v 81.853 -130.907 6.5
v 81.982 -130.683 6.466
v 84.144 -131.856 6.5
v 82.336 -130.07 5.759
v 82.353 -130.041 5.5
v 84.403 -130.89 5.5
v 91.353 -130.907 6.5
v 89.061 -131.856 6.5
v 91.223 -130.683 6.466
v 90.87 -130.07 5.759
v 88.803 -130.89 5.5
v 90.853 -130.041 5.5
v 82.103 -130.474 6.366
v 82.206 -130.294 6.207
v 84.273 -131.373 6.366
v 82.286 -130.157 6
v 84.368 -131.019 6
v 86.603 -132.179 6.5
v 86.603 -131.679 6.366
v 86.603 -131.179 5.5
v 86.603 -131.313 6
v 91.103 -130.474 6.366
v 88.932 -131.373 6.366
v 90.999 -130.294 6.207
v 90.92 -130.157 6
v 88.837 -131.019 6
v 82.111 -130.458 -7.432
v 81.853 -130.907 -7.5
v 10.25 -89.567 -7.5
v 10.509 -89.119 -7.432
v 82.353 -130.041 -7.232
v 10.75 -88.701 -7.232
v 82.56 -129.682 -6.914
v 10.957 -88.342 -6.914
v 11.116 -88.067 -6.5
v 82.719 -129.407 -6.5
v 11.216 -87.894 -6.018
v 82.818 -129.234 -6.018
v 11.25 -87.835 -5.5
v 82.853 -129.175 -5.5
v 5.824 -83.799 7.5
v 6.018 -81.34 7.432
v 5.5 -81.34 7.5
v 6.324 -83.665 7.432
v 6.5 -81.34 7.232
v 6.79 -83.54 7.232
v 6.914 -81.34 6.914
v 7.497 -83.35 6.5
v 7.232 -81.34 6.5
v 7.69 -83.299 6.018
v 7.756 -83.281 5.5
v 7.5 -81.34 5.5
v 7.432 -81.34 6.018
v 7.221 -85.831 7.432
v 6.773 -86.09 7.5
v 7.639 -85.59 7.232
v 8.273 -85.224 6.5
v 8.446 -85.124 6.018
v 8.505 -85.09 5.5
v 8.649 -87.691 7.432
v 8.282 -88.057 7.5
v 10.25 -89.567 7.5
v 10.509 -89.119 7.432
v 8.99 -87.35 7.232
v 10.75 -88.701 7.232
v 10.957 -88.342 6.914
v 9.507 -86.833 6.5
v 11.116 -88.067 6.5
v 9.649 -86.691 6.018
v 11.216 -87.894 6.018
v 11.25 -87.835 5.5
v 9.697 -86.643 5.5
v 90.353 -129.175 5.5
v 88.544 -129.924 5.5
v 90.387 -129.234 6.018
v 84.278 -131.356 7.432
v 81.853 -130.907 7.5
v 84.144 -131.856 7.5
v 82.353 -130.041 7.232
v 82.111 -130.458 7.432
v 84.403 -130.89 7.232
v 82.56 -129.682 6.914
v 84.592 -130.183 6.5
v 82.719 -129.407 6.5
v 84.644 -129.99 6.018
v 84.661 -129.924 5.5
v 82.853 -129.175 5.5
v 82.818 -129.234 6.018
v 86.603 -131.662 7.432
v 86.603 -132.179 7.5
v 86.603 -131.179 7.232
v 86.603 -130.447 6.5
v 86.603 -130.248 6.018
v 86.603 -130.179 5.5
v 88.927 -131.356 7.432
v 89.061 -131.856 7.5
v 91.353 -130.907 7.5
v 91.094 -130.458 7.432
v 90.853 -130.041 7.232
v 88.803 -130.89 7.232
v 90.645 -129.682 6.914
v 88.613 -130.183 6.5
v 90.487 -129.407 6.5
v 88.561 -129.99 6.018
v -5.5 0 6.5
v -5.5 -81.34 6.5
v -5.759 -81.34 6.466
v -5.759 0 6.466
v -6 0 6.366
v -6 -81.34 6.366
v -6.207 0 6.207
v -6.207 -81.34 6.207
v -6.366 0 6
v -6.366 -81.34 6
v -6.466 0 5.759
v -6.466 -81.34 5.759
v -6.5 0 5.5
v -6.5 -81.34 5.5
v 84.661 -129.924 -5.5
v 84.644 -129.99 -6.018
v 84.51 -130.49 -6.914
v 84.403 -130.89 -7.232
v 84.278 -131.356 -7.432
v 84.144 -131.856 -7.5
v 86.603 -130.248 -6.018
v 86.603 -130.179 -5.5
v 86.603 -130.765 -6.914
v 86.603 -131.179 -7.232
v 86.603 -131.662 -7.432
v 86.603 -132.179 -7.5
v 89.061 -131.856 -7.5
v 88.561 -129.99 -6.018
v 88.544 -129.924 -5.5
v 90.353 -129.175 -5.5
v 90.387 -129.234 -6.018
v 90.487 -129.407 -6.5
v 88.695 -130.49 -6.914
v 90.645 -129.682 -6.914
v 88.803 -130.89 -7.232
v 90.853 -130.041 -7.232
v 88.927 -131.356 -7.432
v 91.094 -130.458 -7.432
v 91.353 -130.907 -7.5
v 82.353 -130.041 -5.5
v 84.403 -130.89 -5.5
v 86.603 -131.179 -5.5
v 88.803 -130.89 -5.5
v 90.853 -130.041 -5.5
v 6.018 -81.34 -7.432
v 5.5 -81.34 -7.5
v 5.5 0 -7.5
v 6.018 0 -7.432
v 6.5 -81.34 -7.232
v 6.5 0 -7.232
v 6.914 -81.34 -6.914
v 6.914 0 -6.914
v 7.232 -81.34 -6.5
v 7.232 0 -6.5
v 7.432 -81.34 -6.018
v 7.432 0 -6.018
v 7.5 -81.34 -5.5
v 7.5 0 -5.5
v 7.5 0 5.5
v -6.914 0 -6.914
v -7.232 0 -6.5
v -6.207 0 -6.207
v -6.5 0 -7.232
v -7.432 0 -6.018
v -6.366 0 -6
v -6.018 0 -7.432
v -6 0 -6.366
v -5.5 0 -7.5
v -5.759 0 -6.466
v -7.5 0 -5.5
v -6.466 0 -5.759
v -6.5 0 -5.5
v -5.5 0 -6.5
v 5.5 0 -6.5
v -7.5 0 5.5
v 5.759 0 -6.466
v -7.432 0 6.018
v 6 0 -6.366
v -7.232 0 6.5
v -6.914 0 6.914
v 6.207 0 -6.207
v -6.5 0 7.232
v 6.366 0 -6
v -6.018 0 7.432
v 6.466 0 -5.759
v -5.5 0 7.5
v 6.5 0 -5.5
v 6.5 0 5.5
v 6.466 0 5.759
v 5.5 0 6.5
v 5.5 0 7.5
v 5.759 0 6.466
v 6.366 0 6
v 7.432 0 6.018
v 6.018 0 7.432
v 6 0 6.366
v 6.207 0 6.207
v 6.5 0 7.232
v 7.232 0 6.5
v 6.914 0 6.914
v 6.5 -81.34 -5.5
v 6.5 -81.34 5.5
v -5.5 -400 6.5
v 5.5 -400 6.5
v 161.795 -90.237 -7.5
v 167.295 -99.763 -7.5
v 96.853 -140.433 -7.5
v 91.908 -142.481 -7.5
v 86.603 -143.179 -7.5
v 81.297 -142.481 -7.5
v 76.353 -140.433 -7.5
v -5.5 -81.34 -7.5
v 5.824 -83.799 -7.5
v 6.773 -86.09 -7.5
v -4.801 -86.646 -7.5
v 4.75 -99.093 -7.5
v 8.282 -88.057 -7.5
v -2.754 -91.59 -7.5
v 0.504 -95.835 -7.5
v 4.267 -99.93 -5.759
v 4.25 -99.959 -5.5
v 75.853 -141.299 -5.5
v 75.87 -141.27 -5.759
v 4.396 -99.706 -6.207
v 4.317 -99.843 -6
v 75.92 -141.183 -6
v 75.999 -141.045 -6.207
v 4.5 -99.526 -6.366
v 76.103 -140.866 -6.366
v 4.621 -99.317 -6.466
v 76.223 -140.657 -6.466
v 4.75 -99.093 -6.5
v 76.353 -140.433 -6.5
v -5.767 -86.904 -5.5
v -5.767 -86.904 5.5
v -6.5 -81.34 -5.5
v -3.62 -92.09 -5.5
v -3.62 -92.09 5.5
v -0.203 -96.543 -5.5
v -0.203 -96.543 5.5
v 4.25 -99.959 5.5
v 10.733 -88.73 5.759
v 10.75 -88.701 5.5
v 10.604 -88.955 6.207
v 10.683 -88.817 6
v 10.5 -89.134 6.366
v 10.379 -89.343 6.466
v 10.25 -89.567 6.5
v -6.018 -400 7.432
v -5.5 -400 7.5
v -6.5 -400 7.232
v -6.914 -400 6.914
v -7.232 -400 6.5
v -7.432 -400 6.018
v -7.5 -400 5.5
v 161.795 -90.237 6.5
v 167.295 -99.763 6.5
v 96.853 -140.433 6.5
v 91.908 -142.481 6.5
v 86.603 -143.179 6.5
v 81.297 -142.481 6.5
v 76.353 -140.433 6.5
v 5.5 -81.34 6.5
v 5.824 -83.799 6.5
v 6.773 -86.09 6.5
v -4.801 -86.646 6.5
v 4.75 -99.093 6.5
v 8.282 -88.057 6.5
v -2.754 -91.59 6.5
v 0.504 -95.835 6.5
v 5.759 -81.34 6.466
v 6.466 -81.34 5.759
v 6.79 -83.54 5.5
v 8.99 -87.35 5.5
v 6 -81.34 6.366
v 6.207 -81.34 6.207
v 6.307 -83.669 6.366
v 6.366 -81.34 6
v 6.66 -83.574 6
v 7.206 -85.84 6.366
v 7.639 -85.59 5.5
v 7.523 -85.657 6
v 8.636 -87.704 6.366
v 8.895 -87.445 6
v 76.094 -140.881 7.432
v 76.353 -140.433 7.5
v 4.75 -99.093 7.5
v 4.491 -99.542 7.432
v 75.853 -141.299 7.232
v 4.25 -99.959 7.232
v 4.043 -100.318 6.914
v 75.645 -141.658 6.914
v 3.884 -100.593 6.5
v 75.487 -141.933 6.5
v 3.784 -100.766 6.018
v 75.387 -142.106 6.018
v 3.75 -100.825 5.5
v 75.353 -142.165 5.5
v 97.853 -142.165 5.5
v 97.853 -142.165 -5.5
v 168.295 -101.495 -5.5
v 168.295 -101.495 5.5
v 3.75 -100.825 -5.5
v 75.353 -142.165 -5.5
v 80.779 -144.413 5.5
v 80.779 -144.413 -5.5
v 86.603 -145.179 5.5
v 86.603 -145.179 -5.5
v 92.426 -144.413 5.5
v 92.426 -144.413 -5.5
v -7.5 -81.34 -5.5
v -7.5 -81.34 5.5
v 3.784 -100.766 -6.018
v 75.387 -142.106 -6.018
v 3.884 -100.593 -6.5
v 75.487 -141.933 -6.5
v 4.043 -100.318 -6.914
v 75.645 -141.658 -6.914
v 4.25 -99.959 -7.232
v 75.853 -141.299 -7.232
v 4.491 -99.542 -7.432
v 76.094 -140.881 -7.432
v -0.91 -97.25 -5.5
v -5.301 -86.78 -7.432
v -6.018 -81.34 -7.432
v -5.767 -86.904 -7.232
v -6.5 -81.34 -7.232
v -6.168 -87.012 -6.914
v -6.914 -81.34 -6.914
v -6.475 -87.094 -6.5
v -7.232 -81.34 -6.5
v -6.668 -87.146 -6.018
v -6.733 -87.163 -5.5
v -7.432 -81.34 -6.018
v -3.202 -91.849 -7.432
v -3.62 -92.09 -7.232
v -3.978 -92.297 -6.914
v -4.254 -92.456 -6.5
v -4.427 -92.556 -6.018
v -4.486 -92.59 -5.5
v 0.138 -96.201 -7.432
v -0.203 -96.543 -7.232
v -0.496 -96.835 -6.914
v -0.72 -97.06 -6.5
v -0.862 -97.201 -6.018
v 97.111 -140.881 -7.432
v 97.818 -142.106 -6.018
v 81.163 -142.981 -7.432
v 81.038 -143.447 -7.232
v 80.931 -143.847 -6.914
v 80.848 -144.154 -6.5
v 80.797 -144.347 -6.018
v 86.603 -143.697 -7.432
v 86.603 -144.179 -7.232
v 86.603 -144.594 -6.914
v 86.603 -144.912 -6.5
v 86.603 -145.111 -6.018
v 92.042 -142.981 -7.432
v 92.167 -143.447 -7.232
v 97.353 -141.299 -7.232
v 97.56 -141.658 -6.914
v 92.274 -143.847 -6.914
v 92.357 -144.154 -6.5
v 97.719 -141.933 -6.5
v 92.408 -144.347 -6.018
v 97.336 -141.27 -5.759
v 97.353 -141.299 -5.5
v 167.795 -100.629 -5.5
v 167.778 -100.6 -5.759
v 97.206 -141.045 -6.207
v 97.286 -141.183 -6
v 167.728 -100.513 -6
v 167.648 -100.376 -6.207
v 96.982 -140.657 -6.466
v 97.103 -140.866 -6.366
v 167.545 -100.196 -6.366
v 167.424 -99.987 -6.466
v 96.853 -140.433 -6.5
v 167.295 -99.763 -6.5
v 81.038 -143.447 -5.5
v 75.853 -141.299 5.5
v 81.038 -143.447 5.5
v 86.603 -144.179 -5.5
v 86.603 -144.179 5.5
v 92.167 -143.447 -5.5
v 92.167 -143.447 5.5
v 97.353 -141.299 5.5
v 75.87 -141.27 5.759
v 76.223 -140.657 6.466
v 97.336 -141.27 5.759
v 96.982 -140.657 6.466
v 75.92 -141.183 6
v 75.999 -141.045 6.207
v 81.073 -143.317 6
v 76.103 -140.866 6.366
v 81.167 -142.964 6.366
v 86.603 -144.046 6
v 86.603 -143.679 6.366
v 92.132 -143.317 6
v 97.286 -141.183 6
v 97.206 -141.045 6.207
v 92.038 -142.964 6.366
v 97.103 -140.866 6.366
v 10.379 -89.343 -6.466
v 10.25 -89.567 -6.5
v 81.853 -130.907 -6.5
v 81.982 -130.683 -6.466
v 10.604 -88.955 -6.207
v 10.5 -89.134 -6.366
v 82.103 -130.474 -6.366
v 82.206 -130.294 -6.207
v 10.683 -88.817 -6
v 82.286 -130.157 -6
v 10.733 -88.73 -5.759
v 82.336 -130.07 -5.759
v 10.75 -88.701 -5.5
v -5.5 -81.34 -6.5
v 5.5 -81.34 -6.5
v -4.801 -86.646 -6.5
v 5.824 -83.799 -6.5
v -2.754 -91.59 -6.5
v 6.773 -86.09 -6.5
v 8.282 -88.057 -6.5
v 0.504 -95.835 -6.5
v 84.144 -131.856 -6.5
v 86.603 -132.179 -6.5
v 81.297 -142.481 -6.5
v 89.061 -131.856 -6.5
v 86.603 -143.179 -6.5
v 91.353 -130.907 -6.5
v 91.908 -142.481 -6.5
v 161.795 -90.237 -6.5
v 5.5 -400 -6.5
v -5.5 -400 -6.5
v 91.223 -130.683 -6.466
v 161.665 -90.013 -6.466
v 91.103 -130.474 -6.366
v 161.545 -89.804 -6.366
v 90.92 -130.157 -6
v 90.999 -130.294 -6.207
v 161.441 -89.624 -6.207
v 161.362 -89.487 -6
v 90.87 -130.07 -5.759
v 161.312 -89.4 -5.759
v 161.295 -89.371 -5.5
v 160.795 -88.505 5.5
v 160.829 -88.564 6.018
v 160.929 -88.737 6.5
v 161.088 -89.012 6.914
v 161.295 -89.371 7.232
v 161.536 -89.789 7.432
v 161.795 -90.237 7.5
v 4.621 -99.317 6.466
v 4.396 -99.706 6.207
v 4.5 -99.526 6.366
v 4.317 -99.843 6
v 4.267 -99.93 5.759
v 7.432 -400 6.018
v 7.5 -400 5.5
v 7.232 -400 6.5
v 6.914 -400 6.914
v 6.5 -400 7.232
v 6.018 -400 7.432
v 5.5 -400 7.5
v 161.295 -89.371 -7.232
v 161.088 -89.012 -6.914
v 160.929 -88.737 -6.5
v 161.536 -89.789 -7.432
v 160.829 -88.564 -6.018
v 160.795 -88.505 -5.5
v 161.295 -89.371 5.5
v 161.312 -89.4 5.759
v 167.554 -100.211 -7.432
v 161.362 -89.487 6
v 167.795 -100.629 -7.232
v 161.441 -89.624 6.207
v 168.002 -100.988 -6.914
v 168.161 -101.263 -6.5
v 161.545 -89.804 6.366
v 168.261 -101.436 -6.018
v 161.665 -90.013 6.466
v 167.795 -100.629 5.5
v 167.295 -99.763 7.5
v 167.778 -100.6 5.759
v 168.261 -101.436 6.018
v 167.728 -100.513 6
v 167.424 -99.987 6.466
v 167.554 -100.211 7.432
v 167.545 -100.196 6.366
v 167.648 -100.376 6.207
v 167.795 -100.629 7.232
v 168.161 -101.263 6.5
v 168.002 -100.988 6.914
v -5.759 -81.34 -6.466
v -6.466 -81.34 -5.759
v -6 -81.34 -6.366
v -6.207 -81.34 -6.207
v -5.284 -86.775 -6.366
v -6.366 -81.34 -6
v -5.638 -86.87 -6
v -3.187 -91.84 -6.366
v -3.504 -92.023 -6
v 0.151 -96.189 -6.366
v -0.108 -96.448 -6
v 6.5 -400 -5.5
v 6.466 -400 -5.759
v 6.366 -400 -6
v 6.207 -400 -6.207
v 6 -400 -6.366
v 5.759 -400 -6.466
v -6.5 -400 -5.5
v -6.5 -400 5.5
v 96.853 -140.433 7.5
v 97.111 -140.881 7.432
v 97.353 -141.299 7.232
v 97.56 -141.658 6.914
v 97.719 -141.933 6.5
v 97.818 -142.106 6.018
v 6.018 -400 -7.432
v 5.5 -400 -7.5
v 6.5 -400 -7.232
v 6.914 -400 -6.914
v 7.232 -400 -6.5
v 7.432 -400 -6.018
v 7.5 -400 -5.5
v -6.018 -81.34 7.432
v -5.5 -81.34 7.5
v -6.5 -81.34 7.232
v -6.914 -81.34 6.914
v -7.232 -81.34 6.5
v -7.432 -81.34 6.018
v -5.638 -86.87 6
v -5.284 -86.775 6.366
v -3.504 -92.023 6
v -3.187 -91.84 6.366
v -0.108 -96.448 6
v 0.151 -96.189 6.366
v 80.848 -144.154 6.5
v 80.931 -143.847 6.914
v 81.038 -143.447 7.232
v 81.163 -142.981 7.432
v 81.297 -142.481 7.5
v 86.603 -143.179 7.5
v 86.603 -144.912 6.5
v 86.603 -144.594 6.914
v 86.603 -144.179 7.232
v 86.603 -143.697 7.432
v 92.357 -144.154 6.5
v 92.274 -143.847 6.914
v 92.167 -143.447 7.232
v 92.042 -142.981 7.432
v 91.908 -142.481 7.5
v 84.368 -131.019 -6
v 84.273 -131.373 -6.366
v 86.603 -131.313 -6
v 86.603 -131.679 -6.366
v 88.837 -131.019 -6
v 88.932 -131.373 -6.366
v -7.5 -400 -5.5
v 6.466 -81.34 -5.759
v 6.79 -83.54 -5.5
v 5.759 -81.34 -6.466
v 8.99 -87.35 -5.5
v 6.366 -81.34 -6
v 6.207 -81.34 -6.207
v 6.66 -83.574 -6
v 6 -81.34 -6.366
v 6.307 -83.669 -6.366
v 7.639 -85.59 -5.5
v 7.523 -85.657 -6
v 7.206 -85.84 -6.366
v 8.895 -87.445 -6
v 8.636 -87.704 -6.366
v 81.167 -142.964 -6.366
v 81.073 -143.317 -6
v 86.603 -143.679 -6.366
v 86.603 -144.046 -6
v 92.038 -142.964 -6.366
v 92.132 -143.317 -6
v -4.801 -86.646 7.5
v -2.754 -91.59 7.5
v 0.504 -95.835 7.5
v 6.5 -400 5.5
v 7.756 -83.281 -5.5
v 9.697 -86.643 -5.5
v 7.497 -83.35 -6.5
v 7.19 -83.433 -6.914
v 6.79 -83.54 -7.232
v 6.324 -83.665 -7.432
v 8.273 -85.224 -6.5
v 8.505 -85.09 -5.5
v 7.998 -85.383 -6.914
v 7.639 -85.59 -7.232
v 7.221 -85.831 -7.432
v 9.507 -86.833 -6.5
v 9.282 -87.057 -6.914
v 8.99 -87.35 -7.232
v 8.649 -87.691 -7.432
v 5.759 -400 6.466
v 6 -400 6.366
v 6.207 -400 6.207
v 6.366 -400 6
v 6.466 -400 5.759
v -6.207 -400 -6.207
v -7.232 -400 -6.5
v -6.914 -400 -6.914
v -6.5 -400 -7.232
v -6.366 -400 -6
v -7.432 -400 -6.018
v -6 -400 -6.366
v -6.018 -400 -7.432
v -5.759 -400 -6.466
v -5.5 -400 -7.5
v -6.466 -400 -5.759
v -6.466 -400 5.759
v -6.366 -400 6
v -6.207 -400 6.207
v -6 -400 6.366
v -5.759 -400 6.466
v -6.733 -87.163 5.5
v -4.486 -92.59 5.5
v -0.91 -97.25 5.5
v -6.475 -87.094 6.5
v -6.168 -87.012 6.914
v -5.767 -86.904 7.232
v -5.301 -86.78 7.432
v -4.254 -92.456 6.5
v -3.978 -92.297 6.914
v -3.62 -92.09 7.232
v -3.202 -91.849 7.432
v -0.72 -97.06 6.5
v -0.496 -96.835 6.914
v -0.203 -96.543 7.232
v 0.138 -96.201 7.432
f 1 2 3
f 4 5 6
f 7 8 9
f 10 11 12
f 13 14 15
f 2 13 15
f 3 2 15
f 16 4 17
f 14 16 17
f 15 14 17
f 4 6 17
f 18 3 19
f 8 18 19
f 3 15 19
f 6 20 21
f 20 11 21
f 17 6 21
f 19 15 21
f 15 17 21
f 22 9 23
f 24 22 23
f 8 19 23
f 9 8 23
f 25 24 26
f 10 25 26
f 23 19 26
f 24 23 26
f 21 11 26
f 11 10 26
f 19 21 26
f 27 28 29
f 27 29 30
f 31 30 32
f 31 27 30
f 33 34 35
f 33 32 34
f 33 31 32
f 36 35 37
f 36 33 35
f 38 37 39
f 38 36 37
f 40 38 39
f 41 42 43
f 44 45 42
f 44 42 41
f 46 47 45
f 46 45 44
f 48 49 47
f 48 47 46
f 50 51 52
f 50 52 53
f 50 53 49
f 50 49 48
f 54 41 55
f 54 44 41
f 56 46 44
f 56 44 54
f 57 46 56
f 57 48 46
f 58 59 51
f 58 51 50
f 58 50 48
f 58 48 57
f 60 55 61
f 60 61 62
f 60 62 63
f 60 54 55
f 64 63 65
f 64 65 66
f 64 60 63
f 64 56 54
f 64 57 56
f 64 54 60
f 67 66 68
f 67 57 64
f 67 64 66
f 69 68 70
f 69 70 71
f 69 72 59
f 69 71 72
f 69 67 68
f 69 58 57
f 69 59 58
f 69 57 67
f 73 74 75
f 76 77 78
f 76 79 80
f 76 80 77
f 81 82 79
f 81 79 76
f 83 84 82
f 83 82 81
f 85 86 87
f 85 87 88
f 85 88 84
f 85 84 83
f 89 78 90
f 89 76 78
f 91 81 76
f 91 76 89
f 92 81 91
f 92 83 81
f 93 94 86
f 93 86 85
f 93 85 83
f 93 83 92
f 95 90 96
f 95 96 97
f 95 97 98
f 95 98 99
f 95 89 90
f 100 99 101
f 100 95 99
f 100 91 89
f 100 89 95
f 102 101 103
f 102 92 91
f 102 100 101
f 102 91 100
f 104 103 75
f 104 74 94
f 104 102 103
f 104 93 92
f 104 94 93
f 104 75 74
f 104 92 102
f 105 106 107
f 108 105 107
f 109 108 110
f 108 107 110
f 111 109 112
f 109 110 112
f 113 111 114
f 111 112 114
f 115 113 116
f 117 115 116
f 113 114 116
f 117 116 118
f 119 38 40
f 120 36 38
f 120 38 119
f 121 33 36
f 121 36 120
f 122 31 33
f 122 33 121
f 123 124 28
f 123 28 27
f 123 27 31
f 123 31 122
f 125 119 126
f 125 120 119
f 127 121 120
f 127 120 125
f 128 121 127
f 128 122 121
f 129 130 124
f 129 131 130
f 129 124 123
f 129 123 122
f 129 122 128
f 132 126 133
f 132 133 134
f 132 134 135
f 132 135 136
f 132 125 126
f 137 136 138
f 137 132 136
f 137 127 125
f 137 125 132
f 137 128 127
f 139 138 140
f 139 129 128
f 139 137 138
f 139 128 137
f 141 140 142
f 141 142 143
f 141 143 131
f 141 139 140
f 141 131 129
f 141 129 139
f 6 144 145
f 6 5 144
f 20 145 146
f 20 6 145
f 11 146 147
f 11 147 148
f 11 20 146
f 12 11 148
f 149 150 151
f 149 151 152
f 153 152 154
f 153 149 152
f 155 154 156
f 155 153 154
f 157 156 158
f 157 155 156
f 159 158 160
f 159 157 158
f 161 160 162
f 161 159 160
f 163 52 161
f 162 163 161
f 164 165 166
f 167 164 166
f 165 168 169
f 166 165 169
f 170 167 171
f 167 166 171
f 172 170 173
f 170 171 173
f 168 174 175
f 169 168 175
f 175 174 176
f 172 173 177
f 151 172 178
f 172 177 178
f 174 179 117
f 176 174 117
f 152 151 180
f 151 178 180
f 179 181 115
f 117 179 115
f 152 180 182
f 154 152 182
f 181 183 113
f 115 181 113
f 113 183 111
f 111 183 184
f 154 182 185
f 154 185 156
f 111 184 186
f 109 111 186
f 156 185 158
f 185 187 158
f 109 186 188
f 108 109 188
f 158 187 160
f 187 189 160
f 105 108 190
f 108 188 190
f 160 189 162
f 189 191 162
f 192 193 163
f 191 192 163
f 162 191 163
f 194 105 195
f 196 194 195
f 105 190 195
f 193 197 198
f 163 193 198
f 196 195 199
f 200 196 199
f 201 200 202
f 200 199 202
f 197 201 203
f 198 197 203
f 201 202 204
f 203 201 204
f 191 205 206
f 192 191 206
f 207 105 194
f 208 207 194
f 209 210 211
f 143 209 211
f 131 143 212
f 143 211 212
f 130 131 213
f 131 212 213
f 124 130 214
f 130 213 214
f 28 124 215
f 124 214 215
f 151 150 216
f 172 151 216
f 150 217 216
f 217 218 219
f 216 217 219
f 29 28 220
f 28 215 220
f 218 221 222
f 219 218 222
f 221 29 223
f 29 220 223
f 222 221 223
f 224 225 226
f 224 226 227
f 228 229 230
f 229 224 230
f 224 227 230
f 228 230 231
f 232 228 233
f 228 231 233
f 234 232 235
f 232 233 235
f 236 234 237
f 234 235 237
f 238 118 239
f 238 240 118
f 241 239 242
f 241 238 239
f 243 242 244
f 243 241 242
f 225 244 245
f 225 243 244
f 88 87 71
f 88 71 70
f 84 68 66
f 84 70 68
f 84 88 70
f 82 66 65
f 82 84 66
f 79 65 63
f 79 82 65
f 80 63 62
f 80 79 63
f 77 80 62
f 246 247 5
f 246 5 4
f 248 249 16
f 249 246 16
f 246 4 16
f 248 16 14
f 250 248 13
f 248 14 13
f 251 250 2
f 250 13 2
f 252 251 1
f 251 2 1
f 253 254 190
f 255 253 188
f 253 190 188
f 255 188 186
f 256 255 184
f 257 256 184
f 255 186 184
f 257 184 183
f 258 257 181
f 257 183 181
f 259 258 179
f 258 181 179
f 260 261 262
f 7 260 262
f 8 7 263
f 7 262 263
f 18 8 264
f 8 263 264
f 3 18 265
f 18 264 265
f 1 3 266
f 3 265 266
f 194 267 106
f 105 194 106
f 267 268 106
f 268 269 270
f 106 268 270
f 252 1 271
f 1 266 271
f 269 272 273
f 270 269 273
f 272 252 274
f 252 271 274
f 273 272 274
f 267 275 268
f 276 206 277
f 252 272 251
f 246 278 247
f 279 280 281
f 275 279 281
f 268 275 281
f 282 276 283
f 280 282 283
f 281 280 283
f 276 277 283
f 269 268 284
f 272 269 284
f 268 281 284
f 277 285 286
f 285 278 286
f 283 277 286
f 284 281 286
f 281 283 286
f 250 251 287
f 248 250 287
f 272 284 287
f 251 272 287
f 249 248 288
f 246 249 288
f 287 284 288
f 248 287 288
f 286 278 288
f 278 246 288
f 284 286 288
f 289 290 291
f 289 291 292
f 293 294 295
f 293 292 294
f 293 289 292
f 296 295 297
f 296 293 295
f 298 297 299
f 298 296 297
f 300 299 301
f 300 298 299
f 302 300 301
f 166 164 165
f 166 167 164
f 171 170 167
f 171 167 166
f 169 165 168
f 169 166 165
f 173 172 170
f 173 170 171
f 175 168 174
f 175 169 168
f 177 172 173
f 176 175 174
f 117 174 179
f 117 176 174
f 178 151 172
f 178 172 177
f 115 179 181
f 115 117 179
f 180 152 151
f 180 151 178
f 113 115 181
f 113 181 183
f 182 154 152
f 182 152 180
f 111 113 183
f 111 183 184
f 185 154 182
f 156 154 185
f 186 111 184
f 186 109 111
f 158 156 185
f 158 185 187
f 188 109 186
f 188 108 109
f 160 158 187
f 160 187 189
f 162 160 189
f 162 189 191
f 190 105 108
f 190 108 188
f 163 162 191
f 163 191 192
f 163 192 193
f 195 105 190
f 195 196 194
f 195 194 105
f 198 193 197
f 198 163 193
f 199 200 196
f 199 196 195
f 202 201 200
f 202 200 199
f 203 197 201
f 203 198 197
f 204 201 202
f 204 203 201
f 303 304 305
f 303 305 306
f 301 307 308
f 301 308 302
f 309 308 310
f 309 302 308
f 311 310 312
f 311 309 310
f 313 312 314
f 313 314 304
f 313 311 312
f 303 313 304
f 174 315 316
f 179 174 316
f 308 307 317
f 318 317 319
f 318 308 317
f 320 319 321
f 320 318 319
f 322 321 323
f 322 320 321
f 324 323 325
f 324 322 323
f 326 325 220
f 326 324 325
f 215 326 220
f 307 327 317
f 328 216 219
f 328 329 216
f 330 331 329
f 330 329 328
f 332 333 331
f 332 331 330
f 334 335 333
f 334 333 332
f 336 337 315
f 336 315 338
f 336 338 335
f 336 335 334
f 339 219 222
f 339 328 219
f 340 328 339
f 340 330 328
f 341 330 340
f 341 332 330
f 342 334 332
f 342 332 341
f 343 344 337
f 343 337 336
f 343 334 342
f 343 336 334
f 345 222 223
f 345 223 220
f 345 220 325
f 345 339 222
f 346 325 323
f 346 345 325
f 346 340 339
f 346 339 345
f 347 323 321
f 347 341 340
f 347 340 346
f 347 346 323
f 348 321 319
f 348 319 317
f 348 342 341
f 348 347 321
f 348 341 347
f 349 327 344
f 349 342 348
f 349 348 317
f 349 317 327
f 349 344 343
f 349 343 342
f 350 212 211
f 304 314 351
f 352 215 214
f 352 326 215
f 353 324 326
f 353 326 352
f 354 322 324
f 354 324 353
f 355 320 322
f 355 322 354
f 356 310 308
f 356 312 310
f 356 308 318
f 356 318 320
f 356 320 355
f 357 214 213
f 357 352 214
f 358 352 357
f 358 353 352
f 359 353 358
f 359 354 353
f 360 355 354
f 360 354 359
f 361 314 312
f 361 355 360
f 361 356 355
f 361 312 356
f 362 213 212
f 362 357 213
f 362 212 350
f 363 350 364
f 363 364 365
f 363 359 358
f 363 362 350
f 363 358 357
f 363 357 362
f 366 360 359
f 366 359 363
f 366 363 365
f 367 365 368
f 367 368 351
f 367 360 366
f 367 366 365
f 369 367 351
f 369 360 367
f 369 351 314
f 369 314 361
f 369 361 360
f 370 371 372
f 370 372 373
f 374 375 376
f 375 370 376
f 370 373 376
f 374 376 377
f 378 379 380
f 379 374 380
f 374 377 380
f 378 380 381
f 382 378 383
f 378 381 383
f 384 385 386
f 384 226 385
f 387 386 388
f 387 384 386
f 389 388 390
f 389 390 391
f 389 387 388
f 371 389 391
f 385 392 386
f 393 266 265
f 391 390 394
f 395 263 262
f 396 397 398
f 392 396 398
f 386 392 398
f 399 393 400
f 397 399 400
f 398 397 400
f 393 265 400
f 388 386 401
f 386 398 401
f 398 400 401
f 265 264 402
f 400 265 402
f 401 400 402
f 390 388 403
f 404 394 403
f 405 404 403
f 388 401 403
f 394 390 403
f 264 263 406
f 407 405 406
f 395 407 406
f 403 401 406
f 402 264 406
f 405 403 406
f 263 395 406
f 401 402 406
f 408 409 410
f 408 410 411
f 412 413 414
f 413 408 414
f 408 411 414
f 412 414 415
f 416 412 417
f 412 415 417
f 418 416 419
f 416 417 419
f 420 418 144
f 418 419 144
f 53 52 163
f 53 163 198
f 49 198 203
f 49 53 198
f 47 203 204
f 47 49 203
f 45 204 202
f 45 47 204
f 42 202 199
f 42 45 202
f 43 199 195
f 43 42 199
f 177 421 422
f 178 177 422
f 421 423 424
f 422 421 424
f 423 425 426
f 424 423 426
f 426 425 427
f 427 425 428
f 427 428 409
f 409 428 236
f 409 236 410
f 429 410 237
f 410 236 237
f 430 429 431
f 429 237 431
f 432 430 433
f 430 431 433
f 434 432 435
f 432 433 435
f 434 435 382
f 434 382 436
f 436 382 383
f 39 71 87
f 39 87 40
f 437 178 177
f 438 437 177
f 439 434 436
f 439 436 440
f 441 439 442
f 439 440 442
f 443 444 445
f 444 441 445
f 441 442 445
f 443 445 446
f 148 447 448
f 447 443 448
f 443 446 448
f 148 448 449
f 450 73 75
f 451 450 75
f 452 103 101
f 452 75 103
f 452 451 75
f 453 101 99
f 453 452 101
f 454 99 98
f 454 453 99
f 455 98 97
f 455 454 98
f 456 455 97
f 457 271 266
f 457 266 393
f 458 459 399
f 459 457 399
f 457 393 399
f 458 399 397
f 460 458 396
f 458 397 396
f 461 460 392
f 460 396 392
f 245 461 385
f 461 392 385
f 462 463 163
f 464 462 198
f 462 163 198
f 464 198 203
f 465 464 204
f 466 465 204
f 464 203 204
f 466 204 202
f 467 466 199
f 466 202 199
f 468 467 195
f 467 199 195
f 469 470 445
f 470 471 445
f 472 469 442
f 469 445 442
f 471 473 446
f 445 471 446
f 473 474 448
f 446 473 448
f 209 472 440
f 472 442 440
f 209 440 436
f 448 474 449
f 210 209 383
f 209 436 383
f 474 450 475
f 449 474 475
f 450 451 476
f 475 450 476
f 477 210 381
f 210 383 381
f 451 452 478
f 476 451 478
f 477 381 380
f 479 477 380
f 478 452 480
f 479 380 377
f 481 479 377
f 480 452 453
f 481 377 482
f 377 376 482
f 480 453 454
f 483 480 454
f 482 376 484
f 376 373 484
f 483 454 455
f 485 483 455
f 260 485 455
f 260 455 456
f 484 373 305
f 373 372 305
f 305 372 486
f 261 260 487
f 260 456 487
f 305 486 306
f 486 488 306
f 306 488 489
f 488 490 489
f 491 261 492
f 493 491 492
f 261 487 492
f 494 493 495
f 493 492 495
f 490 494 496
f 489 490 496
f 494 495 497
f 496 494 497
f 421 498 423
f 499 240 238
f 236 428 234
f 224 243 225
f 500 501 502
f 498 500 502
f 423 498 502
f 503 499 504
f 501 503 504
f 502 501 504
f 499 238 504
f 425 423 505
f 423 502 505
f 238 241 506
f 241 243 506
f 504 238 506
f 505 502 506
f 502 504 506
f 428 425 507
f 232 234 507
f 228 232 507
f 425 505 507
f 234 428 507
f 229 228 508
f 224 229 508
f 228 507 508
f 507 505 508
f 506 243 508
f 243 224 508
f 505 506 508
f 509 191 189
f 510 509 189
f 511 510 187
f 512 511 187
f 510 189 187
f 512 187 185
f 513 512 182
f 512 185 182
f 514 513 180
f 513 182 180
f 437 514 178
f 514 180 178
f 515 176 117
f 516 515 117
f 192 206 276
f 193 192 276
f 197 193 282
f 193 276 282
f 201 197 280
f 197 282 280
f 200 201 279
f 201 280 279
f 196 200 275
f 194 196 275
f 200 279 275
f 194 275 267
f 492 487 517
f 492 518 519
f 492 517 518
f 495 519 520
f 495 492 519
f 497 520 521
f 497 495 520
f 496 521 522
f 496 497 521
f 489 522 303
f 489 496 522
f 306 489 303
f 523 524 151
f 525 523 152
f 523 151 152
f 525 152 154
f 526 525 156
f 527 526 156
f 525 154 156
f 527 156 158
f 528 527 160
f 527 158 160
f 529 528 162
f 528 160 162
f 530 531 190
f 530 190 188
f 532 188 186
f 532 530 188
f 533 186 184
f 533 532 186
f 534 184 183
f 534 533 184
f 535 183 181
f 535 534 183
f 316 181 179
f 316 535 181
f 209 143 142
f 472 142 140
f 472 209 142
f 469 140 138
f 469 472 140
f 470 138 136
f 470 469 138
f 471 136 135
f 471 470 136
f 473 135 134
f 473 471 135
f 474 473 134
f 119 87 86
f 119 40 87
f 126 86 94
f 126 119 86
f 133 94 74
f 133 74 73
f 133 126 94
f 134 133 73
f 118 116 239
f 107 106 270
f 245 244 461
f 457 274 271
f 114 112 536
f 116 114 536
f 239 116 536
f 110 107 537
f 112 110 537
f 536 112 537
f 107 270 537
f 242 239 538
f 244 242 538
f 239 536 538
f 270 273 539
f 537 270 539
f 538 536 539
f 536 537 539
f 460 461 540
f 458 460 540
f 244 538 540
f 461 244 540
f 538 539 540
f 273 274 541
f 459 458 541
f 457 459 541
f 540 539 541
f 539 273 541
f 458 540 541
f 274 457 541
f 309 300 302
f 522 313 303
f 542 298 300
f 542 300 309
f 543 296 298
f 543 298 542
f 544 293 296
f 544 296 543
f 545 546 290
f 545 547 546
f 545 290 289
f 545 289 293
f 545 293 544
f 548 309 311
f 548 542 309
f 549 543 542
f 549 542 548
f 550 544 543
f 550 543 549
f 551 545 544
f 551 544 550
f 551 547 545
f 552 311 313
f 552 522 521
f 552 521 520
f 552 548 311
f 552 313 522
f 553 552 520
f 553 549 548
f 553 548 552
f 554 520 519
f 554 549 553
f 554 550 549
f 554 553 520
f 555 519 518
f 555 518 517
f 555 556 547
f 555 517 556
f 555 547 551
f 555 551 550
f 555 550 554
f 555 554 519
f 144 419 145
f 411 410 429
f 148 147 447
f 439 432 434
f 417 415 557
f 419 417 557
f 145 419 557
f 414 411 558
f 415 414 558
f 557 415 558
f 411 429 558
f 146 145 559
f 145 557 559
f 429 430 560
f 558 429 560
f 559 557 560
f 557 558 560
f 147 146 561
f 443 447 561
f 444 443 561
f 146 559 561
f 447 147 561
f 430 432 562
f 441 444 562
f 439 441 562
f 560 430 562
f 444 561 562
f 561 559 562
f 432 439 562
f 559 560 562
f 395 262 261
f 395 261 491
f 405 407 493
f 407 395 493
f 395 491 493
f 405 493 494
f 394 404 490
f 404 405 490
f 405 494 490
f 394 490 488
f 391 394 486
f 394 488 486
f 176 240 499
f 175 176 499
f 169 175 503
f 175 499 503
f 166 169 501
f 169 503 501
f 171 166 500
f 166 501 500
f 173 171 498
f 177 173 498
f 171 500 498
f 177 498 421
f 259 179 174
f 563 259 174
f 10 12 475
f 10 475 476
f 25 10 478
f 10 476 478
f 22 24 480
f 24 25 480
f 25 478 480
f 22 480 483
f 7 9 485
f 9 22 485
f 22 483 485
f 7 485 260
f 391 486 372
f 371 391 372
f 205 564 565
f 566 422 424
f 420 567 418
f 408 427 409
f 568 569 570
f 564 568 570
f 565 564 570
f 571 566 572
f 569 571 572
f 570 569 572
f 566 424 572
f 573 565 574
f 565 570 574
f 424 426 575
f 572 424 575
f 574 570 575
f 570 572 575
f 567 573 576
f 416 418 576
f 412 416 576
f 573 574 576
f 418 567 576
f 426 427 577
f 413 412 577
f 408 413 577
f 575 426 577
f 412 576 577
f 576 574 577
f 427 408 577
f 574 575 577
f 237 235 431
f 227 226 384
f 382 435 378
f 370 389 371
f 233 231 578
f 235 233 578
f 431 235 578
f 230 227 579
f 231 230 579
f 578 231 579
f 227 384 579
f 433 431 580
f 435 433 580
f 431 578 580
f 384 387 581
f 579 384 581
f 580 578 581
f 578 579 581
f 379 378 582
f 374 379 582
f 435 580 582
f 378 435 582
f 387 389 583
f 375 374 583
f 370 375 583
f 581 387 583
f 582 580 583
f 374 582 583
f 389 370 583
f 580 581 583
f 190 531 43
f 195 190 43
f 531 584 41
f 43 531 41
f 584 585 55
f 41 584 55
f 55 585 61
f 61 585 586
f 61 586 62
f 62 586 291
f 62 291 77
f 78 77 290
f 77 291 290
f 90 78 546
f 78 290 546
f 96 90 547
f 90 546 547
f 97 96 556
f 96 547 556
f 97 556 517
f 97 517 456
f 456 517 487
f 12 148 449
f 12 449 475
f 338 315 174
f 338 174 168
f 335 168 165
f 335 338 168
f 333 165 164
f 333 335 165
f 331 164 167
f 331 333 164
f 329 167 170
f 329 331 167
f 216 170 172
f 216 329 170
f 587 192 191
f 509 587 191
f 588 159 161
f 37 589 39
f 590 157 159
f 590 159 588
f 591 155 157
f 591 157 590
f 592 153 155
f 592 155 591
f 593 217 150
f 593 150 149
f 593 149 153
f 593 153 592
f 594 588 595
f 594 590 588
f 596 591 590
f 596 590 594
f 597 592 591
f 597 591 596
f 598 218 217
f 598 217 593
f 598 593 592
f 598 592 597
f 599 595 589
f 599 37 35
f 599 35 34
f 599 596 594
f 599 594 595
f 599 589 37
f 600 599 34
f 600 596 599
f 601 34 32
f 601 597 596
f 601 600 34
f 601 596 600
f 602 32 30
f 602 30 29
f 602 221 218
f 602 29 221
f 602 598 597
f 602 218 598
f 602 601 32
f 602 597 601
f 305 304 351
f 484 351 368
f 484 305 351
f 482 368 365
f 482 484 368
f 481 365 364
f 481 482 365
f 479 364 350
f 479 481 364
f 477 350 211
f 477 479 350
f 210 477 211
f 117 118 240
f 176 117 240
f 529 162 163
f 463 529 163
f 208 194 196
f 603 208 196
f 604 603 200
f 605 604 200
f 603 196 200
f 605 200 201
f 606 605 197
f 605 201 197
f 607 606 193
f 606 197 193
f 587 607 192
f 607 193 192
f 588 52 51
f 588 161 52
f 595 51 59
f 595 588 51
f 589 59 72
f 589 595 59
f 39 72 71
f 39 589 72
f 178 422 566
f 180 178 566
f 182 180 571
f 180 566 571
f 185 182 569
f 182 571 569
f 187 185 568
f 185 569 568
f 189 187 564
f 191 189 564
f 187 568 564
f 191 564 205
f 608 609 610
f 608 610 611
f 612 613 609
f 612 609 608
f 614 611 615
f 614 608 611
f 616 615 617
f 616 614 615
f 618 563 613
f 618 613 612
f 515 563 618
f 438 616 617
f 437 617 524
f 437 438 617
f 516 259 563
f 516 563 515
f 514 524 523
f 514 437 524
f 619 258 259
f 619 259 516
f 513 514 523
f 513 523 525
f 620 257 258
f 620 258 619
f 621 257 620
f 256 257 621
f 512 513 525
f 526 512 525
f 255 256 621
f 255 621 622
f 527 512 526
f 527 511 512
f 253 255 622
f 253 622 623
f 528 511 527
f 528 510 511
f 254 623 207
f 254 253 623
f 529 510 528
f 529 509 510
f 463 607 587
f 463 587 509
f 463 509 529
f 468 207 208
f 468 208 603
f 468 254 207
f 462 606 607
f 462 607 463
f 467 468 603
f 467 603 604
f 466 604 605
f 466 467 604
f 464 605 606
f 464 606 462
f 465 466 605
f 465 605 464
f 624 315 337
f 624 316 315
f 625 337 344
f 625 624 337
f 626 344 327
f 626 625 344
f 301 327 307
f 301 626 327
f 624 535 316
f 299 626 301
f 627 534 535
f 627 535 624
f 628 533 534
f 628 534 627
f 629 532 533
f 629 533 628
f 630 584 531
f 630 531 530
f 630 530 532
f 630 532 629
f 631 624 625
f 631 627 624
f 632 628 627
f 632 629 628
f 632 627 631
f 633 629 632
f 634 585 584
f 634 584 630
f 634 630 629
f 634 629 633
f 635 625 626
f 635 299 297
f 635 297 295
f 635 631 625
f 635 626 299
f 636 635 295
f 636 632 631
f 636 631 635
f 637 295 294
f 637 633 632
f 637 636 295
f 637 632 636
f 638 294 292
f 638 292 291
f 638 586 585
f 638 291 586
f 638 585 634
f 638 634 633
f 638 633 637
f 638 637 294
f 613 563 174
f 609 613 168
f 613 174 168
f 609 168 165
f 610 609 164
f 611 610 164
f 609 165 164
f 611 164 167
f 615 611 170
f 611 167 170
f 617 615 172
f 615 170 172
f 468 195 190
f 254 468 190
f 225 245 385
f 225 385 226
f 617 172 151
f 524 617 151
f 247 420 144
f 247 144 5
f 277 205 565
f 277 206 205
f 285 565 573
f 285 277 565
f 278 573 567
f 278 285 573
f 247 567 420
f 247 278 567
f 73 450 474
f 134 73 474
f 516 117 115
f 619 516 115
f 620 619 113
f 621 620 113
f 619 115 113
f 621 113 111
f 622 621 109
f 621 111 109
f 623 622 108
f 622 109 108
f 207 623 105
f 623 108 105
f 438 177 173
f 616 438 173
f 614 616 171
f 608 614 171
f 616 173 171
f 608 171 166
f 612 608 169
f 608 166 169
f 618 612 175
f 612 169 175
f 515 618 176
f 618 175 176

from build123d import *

# Parameters (mm, degrees)
F1_DEPTH = 400


with BuildPart() as f1:
    # F0 (on Front) → F1 (new body)
    with BuildSketch(Plane.XZ):
        with BuildLine():
            ThreePointArc((7.5, 5.5), (6.9142135624, 6.9142135624), (5.5, 7.5))
            Line((5.5, 7.5), (-5.5, 7.5))
            ThreePointArc((-5.5, 7.5), (-6.9142135624, 6.9142135624), (-7.5, 5.5))
            Line((-7.5, 5.5), (-7.5, -5.5))
            ThreePointArc((-7.5, -5.5), (-6.9142135624, -6.9142135624), (-5.5, -7.5))
            Line((-5.5, -7.5), (5.5, -7.5))
            ThreePointArc((5.5, -7.5), (6.9142135624, -6.9142135624), (7.5, -5.5))
            Line((7.5, -5.5), (7.5, 5.5))
        make_face()
        with BuildLine():
            Line((-5.5, 6.5), (5.5, 6.5))
            ThreePointArc((5.5, 6.5), (6.2071067812, 6.2071067812), (6.5, 5.5))
            Line((6.5, 5.5), (6.5, -5.5))
            ThreePointArc((6.5, -5.5), (6.2071067812, -6.2071067812), (5.5, -6.5))
            Line((5.5, -6.5), (-5.5, -6.5))
            ThreePointArc((-5.5, -6.5), (-6.2071067812, -6.2071067812), (-6.5, -5.5))
            Line((-6.5, -5.5), (-6.5, 5.5))
            ThreePointArc((-6.5, 5.5), (-6.2071067812, 6.2071067812), (-5.5, 6.5))
        make_face(mode=Mode.SUBTRACT)
    extrude(amount=F1_DEPTH)


with BuildPart() as f3:
    # F3: sweep along a path in F2
    with BuildLine(Plane.XY) as f3_path:
        Line((0, 0), (0, -81.3397459622))
        ThreePointArc((0, -81.3397459622), (2.0096189432, -88.8397459622), (7.5, -94.3301270189))
        Line((7.5, -94.3301270189), (79.1025403784, -135.6698729811))
        ThreePointArc((79.1025403784, -135.6698729811), (86.6025403784, -137.6794919243), (94.1025403784, -135.6698729811))
        Line((94.1025403784, -135.6698729811), (164.544826719, -95))
    # F1_face (on face) → F3 (sweep)
    with BuildSketch(Plane(origin=(0, 0, 0), x_dir=(1, 0, 0), z_dir=(0, 1, 0))):
        with BuildLine():
            ThreePointArc((5.5, -7.5), (6.9142135624, -6.9142135624), (7.5, -5.5))
            Line((7.5, -5.5), (7.5, 5.5))
            ThreePointArc((7.5, 5.5), (6.9142135624, 6.9142135624), (5.5, 7.5))
            Line((5.5, 7.5), (-5.5, 7.5))
            ThreePointArc((-5.5, 7.5), (-6.9142135624, 6.9142135624), (-7.5, 5.5))
            Line((-7.5, 5.5), (-7.5, -5.5))
            ThreePointArc((-7.5, -5.5), (-6.9142135624, -6.9142135624), (-5.5, -7.5))
            Line((-5.5, -7.5), (5.5, -7.5))
        make_face()
        with BuildLine():
            Line((5.5, -6.5), (-5.5, -6.5))
            ThreePointArc((-5.5, -6.5), (-6.2071067812, -6.2071067812), (-6.5, -5.5))
            Line((-6.5, -5.5), (-6.5, 5.5))
            ThreePointArc((-6.5, 5.5), (-6.2071067812, 6.2071067812), (-5.5, 6.5))
            Line((-5.5, 6.5), (5.5, 6.5))
            ThreePointArc((5.5, 6.5), (6.2071067812, 6.2071067812), (6.5, 5.5))
            Line((6.5, 5.5), (6.5, -5.5))
            ThreePointArc((6.5, -5.5), (6.2071067812, -6.2071067812), (5.5, -6.5))
        make_face(mode=Mode.SUBTRACT)
    sweep(path=f3_path.line)


solid = Compound([f1.part, f3.part])
